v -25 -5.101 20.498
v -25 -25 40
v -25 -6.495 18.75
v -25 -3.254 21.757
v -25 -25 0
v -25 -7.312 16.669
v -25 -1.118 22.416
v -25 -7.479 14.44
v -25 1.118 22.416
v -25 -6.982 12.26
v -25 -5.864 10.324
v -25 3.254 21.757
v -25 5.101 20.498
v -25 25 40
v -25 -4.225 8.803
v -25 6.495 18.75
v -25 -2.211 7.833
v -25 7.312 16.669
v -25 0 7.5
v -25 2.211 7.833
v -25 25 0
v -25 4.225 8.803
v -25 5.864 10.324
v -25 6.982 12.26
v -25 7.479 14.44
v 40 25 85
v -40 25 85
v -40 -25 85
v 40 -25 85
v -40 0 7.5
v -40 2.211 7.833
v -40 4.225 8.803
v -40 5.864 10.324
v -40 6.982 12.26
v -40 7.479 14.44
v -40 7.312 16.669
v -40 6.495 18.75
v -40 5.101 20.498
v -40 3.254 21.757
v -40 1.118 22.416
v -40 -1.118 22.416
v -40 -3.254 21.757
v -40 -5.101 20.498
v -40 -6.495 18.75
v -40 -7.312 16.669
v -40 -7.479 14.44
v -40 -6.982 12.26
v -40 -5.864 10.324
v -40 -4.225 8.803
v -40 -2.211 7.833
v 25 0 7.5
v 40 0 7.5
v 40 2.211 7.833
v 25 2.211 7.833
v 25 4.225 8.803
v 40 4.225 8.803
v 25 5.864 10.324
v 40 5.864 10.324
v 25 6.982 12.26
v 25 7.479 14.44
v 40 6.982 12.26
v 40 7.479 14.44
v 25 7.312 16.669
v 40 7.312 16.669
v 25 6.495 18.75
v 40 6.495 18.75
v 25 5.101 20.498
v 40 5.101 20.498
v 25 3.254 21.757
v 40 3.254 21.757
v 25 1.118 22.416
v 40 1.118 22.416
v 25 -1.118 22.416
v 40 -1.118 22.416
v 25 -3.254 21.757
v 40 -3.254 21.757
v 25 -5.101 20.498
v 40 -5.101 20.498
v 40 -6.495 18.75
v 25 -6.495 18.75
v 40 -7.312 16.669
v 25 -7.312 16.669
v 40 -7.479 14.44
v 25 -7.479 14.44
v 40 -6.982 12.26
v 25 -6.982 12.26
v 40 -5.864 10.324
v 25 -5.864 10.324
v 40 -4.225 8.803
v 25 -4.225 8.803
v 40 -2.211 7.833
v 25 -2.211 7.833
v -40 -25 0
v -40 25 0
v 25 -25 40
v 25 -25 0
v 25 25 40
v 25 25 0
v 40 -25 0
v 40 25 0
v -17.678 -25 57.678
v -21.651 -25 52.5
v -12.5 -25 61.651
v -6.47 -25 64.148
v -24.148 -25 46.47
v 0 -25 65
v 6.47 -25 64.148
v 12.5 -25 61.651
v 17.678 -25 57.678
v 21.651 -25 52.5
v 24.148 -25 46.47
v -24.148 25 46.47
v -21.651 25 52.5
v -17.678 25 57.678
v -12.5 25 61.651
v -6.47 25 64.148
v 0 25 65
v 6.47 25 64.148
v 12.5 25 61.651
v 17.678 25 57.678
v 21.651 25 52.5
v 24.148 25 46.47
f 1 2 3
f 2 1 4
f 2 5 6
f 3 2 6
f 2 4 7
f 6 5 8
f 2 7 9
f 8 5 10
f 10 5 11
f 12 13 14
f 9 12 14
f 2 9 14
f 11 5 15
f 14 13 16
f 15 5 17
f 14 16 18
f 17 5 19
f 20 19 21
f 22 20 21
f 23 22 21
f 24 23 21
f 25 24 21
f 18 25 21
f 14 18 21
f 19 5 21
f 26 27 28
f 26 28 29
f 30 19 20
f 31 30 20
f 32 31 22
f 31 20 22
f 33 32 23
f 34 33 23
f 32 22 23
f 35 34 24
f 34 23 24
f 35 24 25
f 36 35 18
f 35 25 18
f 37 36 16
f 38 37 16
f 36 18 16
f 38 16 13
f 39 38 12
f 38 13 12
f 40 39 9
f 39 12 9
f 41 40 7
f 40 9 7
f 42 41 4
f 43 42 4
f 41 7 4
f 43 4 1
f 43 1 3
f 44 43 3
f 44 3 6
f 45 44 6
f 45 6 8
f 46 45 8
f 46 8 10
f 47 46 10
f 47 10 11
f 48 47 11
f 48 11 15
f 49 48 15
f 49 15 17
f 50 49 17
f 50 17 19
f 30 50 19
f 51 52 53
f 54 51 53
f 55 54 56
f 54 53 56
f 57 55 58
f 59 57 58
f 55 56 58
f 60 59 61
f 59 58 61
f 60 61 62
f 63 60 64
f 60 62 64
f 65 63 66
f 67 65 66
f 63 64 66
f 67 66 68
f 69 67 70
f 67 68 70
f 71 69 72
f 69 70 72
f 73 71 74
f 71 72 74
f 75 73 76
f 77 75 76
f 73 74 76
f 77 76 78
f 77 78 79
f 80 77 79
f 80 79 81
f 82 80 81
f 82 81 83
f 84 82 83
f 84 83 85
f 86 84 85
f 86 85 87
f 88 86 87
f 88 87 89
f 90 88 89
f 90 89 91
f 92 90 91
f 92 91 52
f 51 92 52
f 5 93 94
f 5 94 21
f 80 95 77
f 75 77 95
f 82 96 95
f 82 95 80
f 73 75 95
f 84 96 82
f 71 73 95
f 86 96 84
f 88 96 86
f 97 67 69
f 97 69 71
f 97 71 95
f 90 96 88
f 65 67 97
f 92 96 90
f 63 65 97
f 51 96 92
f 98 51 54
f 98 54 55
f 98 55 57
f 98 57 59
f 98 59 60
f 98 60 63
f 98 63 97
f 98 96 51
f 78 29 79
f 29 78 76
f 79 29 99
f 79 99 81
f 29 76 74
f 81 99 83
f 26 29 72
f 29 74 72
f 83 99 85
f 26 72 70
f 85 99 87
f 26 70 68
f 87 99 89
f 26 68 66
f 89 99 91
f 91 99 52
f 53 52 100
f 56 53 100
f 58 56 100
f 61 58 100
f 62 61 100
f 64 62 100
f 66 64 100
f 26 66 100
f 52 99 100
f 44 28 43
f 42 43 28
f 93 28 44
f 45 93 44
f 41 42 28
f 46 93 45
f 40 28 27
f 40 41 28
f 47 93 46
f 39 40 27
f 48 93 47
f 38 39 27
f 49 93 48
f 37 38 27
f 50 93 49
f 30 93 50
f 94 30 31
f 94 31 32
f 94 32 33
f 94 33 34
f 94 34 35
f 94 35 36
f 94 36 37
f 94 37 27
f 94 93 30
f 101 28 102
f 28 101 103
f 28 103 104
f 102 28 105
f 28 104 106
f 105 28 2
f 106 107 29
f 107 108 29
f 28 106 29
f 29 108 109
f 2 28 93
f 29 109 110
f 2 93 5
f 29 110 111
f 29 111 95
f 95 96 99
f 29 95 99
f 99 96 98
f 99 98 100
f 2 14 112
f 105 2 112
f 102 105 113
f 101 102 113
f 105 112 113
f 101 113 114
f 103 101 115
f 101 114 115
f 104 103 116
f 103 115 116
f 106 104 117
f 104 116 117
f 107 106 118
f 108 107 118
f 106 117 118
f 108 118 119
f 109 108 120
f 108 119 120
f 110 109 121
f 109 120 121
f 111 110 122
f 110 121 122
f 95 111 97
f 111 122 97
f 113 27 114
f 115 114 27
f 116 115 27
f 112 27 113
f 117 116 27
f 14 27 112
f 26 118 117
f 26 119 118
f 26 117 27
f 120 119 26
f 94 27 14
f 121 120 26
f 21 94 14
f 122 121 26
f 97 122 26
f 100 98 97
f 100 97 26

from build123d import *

# Parameters (mm, degrees)
SKETCH1_W           = 80
SKETCH1_H           = 50
BOSS_EXTRUDE1_DEPTH = 85
SKETCH3_W           = 50
SKETCH3_H           = 55.289699502
CUT_EXTRUDE1_DEPTH  = 40
SKETCH4_R           = 7.5
CUT_EXTRUDE3_DEPTH  = 120.373363863
CUT_EXTRUDE4_DEPTH  = 107.418983269


with BuildPart() as part:
    # Sketch1 → Boss-Extrude1 (new body)
    with BuildSketch(Plane.XY):
        Rectangle(SKETCH1_W, SKETCH1_H)
    extrude(amount=BOSS_EXTRUDE1_DEPTH)

    # Sketch3 → Cut-Extrude1 (cut)
    with BuildSketch(Plane(origin=(0, 0, 0), x_dir=(-1, 0, 0), z_dir=(0, 0, -1))):
        Rectangle(SKETCH3_W, SKETCH3_H)
    extrude(amount=-CUT_EXTRUDE1_DEPTH, mode=Mode.SUBTRACT)

    # Sketch4 → Cut-Extrude3 (cut, through all)
    with BuildSketch(Plane(origin=(40, 0, 0), x_dir=(0, 0, -1), z_dir=(1, 0, 0))):
        with Locations((-15, 0)):
            Circle(SKETCH4_R)
    extrude(amount=-CUT_EXTRUDE3_DEPTH, mode=Mode.SUBTRACT)

    # Sketch5 → Cut-Extrude4 (cut, through all)
    with BuildSketch(Plane(origin=(0, 25, 0), x_dir=(1, 0, 0), z_dir=(0, 1, 0))):
        with BuildLine():
            Line((25, -40), (-25, -40))
            ThreePointArc((-25, -40), (0, -65), (25, -40))
        make_face()
    extrude(amount=-CUT_EXTRUDE4_DEPTH, mode=Mode.SUBTRACT)


solid = part.part
